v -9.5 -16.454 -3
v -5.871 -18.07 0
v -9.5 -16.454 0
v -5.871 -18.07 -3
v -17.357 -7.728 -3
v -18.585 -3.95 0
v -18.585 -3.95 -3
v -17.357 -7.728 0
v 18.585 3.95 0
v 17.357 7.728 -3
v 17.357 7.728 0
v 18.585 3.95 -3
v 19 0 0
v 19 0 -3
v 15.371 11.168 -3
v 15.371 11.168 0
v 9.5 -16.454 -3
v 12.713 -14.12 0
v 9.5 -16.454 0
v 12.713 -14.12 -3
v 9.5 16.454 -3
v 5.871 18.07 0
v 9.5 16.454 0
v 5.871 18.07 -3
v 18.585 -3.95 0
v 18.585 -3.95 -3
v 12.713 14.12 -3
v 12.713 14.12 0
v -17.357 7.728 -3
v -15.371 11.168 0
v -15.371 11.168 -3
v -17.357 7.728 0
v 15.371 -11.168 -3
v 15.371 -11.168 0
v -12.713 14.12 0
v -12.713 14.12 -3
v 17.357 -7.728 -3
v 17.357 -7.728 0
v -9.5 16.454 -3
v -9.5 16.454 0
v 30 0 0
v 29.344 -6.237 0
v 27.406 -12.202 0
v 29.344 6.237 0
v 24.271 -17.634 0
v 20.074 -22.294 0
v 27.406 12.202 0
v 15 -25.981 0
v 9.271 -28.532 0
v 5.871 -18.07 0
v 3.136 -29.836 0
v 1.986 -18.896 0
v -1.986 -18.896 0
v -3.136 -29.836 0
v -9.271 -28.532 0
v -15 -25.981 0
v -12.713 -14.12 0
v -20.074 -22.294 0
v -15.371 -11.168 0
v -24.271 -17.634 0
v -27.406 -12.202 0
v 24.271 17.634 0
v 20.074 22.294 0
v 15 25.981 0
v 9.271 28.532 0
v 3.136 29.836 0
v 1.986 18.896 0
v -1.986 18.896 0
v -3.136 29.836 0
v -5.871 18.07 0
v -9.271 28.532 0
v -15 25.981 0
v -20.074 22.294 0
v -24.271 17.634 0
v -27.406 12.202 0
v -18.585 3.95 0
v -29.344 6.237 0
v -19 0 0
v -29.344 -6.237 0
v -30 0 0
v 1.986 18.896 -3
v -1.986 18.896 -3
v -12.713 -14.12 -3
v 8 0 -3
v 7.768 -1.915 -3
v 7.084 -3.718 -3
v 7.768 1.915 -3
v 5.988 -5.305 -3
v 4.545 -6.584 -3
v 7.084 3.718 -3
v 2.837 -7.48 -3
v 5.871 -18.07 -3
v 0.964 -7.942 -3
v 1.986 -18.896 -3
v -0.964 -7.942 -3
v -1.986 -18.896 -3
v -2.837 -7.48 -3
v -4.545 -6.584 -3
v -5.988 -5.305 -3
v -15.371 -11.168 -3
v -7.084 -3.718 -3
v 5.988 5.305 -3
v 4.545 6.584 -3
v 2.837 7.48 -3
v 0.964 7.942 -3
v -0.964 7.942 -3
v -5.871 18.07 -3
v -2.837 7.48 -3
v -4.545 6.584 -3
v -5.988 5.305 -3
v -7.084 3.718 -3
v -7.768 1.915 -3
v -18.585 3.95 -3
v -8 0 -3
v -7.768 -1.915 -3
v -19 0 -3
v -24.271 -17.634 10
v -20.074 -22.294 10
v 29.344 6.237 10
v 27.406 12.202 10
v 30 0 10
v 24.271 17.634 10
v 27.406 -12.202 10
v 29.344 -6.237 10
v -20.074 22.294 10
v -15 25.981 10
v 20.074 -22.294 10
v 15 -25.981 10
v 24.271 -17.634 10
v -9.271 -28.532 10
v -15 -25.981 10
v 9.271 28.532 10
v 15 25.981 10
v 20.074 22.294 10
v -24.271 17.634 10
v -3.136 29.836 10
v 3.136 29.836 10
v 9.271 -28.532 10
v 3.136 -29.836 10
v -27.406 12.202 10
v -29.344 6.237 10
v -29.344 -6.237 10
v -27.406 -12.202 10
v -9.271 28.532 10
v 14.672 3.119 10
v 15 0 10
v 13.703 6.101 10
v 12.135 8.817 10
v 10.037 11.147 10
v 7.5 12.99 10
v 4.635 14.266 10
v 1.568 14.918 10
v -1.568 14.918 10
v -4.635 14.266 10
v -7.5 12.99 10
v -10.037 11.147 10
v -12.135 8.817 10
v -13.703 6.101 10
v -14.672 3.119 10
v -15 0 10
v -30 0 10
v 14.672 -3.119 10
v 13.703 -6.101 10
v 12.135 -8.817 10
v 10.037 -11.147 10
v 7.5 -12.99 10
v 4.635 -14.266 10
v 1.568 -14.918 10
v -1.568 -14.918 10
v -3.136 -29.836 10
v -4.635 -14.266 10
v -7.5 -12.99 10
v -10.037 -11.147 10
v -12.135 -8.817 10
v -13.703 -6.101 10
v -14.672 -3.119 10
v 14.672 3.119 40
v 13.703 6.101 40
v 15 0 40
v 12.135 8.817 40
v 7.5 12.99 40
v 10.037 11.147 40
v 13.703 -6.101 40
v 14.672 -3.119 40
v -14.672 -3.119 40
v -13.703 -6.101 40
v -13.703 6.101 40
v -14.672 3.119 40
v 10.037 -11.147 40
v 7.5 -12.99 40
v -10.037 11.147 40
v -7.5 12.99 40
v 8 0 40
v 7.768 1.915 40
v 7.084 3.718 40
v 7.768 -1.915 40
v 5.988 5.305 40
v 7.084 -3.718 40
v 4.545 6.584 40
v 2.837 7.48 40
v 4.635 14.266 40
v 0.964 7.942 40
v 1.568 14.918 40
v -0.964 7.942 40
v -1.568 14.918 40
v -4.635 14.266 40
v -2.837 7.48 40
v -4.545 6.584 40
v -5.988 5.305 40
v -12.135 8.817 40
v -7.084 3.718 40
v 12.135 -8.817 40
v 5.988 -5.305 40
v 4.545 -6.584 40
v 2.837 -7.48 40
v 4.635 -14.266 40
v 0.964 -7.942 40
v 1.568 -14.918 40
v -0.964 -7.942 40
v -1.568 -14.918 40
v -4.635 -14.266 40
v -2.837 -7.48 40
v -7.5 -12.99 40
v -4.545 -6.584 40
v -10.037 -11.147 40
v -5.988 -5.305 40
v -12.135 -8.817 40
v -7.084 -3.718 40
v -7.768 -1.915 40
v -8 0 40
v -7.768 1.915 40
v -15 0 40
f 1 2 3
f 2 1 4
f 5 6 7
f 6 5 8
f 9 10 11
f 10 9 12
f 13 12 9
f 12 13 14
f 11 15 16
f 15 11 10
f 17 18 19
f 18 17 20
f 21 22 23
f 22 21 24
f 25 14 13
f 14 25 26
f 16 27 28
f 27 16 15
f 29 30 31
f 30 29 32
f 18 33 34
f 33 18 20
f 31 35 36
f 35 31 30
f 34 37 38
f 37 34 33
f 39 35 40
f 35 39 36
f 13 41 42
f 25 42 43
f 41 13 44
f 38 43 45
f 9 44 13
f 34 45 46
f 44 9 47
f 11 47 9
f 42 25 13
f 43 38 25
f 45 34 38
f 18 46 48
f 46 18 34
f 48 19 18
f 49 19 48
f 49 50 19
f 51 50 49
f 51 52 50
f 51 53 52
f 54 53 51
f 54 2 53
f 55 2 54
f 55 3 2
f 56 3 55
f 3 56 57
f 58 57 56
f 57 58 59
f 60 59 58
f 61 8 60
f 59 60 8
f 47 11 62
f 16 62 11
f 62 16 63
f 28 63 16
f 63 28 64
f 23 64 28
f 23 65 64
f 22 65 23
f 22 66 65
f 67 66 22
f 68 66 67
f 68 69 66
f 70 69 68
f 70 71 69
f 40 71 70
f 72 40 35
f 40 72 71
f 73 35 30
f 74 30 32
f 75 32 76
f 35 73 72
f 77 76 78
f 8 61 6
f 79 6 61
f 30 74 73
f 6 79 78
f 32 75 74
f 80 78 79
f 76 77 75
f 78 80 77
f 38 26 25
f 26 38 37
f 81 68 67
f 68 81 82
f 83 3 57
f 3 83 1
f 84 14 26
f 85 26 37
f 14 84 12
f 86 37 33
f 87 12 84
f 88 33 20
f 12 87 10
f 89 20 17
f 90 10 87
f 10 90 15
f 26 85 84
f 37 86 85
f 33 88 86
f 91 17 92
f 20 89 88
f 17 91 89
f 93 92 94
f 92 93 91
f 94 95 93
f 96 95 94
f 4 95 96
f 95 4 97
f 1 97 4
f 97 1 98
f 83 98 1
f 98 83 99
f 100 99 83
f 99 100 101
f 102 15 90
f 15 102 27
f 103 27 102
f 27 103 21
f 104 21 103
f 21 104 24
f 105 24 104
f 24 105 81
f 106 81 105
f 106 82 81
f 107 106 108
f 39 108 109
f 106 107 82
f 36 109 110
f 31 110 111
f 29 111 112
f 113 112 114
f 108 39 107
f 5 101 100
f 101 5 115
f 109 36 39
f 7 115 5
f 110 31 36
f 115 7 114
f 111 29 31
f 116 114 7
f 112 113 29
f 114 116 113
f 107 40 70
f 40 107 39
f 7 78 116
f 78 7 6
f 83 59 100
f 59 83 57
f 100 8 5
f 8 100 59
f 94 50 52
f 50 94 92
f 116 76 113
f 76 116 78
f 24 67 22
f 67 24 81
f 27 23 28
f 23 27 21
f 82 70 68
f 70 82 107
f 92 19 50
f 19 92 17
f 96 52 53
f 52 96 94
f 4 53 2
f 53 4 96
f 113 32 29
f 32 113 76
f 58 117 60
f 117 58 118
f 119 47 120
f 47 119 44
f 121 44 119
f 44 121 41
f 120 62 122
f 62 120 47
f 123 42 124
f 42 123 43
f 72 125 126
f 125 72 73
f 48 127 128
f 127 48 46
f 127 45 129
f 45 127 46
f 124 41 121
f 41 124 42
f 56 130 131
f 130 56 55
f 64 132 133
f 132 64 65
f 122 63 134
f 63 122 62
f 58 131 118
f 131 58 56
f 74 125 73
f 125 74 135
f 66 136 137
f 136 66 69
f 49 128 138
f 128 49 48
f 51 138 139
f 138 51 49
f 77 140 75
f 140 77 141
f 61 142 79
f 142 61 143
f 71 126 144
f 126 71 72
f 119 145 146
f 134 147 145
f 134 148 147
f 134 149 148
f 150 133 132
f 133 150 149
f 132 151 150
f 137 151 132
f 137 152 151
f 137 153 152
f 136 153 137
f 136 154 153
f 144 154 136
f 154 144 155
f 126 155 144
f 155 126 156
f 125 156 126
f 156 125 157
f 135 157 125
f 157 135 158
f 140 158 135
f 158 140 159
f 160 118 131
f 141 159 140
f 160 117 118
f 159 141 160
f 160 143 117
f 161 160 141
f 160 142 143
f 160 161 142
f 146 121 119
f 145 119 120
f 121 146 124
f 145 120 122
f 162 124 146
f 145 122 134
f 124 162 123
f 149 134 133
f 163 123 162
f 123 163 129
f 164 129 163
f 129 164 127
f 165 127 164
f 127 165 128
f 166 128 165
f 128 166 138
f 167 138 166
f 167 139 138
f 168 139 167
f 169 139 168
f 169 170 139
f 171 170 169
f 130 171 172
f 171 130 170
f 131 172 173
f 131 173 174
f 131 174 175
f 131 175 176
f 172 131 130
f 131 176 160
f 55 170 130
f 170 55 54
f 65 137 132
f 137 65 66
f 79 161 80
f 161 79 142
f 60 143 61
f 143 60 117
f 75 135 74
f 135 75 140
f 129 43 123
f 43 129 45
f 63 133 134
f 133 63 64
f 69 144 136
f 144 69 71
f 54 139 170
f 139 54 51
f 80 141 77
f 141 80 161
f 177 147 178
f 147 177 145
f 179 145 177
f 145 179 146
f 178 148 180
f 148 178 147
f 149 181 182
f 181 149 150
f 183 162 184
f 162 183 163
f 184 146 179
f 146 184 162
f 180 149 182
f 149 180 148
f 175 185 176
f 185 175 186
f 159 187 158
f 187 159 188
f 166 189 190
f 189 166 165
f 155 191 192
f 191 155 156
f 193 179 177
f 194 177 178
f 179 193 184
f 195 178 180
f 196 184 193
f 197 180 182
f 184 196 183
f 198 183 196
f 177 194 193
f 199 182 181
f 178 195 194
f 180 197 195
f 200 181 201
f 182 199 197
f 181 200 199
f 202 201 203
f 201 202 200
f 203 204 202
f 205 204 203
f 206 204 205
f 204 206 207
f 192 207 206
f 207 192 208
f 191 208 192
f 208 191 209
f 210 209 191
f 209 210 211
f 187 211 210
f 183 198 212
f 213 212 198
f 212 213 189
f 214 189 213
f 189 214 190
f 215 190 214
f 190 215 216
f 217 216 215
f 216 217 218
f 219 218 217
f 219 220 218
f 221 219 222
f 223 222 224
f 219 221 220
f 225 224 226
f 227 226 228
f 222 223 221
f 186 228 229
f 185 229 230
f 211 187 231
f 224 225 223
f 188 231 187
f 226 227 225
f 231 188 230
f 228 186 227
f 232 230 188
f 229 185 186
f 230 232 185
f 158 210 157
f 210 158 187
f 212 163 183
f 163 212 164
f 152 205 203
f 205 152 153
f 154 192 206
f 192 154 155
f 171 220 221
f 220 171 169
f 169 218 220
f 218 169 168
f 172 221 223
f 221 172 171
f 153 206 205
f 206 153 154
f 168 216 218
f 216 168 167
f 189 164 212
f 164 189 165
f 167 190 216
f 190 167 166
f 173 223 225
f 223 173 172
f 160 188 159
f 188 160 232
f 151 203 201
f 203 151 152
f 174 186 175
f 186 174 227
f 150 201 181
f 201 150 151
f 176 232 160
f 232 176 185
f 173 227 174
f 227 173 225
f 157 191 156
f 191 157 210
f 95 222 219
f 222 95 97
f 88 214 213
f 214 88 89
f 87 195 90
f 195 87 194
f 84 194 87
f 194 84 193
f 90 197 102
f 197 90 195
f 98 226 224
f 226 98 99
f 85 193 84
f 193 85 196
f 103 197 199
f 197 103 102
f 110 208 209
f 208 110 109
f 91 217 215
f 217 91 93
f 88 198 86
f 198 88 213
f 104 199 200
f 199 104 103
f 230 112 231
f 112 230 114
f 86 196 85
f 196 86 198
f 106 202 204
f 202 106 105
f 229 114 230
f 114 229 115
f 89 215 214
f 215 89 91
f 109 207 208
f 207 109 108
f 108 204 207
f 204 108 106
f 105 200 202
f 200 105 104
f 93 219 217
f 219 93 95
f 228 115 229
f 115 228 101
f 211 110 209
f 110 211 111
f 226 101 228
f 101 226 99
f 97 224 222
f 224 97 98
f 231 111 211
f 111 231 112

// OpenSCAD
// file: ../../../../../primitives/assembly_instruction.scad
module AssemblyInstruction(part, instruction)
{
  echo("assembly_instruction", part, instruction);
}
// file: ../../../../../dimensions.scad
axle_diameter = 16;

box_section_outer = [25, 25];

outer = 210;
inner = 120;

outer_length = 775;
inner_length = 1000;

wheel_centre_distance = 600;
// main file
include <../../../../../dimensions.scad>;

use <../../../../../primitives/assembly_instruction.scad>;

disc_lip_width = 3;
disc_lip_diameter = 38;

disc_face_width = 10;
disc_face_diameter = 60;

axle_clamp_width = 40;
axle_clamp_diameter = 30;

module AxleMount()
{
  difference()
  {
    union()
    {
      translate([0, 0, -disc_lip_width])
      {
        cylinder(d=disc_lip_diameter, h=disc_lip_width);
      }

      AssemblyInstruction(
          "disc_face_plate",
          "drill and tap holes for brake disc mounting as appropriate");
      cylinder(d=disc_face_diameter, h=disc_face_width);

      AssemblyInstruction(
          "axle_clamp",
          "drill and tap holes for axle key screws as appropriate");
      cylinder(d=axle_clamp_diameter, h=axle_clamp_width);
    }

    /* Axle hole */
    cylinder(d=axle_diameter, h=100, center=true);
  }
}

AxleMount();
